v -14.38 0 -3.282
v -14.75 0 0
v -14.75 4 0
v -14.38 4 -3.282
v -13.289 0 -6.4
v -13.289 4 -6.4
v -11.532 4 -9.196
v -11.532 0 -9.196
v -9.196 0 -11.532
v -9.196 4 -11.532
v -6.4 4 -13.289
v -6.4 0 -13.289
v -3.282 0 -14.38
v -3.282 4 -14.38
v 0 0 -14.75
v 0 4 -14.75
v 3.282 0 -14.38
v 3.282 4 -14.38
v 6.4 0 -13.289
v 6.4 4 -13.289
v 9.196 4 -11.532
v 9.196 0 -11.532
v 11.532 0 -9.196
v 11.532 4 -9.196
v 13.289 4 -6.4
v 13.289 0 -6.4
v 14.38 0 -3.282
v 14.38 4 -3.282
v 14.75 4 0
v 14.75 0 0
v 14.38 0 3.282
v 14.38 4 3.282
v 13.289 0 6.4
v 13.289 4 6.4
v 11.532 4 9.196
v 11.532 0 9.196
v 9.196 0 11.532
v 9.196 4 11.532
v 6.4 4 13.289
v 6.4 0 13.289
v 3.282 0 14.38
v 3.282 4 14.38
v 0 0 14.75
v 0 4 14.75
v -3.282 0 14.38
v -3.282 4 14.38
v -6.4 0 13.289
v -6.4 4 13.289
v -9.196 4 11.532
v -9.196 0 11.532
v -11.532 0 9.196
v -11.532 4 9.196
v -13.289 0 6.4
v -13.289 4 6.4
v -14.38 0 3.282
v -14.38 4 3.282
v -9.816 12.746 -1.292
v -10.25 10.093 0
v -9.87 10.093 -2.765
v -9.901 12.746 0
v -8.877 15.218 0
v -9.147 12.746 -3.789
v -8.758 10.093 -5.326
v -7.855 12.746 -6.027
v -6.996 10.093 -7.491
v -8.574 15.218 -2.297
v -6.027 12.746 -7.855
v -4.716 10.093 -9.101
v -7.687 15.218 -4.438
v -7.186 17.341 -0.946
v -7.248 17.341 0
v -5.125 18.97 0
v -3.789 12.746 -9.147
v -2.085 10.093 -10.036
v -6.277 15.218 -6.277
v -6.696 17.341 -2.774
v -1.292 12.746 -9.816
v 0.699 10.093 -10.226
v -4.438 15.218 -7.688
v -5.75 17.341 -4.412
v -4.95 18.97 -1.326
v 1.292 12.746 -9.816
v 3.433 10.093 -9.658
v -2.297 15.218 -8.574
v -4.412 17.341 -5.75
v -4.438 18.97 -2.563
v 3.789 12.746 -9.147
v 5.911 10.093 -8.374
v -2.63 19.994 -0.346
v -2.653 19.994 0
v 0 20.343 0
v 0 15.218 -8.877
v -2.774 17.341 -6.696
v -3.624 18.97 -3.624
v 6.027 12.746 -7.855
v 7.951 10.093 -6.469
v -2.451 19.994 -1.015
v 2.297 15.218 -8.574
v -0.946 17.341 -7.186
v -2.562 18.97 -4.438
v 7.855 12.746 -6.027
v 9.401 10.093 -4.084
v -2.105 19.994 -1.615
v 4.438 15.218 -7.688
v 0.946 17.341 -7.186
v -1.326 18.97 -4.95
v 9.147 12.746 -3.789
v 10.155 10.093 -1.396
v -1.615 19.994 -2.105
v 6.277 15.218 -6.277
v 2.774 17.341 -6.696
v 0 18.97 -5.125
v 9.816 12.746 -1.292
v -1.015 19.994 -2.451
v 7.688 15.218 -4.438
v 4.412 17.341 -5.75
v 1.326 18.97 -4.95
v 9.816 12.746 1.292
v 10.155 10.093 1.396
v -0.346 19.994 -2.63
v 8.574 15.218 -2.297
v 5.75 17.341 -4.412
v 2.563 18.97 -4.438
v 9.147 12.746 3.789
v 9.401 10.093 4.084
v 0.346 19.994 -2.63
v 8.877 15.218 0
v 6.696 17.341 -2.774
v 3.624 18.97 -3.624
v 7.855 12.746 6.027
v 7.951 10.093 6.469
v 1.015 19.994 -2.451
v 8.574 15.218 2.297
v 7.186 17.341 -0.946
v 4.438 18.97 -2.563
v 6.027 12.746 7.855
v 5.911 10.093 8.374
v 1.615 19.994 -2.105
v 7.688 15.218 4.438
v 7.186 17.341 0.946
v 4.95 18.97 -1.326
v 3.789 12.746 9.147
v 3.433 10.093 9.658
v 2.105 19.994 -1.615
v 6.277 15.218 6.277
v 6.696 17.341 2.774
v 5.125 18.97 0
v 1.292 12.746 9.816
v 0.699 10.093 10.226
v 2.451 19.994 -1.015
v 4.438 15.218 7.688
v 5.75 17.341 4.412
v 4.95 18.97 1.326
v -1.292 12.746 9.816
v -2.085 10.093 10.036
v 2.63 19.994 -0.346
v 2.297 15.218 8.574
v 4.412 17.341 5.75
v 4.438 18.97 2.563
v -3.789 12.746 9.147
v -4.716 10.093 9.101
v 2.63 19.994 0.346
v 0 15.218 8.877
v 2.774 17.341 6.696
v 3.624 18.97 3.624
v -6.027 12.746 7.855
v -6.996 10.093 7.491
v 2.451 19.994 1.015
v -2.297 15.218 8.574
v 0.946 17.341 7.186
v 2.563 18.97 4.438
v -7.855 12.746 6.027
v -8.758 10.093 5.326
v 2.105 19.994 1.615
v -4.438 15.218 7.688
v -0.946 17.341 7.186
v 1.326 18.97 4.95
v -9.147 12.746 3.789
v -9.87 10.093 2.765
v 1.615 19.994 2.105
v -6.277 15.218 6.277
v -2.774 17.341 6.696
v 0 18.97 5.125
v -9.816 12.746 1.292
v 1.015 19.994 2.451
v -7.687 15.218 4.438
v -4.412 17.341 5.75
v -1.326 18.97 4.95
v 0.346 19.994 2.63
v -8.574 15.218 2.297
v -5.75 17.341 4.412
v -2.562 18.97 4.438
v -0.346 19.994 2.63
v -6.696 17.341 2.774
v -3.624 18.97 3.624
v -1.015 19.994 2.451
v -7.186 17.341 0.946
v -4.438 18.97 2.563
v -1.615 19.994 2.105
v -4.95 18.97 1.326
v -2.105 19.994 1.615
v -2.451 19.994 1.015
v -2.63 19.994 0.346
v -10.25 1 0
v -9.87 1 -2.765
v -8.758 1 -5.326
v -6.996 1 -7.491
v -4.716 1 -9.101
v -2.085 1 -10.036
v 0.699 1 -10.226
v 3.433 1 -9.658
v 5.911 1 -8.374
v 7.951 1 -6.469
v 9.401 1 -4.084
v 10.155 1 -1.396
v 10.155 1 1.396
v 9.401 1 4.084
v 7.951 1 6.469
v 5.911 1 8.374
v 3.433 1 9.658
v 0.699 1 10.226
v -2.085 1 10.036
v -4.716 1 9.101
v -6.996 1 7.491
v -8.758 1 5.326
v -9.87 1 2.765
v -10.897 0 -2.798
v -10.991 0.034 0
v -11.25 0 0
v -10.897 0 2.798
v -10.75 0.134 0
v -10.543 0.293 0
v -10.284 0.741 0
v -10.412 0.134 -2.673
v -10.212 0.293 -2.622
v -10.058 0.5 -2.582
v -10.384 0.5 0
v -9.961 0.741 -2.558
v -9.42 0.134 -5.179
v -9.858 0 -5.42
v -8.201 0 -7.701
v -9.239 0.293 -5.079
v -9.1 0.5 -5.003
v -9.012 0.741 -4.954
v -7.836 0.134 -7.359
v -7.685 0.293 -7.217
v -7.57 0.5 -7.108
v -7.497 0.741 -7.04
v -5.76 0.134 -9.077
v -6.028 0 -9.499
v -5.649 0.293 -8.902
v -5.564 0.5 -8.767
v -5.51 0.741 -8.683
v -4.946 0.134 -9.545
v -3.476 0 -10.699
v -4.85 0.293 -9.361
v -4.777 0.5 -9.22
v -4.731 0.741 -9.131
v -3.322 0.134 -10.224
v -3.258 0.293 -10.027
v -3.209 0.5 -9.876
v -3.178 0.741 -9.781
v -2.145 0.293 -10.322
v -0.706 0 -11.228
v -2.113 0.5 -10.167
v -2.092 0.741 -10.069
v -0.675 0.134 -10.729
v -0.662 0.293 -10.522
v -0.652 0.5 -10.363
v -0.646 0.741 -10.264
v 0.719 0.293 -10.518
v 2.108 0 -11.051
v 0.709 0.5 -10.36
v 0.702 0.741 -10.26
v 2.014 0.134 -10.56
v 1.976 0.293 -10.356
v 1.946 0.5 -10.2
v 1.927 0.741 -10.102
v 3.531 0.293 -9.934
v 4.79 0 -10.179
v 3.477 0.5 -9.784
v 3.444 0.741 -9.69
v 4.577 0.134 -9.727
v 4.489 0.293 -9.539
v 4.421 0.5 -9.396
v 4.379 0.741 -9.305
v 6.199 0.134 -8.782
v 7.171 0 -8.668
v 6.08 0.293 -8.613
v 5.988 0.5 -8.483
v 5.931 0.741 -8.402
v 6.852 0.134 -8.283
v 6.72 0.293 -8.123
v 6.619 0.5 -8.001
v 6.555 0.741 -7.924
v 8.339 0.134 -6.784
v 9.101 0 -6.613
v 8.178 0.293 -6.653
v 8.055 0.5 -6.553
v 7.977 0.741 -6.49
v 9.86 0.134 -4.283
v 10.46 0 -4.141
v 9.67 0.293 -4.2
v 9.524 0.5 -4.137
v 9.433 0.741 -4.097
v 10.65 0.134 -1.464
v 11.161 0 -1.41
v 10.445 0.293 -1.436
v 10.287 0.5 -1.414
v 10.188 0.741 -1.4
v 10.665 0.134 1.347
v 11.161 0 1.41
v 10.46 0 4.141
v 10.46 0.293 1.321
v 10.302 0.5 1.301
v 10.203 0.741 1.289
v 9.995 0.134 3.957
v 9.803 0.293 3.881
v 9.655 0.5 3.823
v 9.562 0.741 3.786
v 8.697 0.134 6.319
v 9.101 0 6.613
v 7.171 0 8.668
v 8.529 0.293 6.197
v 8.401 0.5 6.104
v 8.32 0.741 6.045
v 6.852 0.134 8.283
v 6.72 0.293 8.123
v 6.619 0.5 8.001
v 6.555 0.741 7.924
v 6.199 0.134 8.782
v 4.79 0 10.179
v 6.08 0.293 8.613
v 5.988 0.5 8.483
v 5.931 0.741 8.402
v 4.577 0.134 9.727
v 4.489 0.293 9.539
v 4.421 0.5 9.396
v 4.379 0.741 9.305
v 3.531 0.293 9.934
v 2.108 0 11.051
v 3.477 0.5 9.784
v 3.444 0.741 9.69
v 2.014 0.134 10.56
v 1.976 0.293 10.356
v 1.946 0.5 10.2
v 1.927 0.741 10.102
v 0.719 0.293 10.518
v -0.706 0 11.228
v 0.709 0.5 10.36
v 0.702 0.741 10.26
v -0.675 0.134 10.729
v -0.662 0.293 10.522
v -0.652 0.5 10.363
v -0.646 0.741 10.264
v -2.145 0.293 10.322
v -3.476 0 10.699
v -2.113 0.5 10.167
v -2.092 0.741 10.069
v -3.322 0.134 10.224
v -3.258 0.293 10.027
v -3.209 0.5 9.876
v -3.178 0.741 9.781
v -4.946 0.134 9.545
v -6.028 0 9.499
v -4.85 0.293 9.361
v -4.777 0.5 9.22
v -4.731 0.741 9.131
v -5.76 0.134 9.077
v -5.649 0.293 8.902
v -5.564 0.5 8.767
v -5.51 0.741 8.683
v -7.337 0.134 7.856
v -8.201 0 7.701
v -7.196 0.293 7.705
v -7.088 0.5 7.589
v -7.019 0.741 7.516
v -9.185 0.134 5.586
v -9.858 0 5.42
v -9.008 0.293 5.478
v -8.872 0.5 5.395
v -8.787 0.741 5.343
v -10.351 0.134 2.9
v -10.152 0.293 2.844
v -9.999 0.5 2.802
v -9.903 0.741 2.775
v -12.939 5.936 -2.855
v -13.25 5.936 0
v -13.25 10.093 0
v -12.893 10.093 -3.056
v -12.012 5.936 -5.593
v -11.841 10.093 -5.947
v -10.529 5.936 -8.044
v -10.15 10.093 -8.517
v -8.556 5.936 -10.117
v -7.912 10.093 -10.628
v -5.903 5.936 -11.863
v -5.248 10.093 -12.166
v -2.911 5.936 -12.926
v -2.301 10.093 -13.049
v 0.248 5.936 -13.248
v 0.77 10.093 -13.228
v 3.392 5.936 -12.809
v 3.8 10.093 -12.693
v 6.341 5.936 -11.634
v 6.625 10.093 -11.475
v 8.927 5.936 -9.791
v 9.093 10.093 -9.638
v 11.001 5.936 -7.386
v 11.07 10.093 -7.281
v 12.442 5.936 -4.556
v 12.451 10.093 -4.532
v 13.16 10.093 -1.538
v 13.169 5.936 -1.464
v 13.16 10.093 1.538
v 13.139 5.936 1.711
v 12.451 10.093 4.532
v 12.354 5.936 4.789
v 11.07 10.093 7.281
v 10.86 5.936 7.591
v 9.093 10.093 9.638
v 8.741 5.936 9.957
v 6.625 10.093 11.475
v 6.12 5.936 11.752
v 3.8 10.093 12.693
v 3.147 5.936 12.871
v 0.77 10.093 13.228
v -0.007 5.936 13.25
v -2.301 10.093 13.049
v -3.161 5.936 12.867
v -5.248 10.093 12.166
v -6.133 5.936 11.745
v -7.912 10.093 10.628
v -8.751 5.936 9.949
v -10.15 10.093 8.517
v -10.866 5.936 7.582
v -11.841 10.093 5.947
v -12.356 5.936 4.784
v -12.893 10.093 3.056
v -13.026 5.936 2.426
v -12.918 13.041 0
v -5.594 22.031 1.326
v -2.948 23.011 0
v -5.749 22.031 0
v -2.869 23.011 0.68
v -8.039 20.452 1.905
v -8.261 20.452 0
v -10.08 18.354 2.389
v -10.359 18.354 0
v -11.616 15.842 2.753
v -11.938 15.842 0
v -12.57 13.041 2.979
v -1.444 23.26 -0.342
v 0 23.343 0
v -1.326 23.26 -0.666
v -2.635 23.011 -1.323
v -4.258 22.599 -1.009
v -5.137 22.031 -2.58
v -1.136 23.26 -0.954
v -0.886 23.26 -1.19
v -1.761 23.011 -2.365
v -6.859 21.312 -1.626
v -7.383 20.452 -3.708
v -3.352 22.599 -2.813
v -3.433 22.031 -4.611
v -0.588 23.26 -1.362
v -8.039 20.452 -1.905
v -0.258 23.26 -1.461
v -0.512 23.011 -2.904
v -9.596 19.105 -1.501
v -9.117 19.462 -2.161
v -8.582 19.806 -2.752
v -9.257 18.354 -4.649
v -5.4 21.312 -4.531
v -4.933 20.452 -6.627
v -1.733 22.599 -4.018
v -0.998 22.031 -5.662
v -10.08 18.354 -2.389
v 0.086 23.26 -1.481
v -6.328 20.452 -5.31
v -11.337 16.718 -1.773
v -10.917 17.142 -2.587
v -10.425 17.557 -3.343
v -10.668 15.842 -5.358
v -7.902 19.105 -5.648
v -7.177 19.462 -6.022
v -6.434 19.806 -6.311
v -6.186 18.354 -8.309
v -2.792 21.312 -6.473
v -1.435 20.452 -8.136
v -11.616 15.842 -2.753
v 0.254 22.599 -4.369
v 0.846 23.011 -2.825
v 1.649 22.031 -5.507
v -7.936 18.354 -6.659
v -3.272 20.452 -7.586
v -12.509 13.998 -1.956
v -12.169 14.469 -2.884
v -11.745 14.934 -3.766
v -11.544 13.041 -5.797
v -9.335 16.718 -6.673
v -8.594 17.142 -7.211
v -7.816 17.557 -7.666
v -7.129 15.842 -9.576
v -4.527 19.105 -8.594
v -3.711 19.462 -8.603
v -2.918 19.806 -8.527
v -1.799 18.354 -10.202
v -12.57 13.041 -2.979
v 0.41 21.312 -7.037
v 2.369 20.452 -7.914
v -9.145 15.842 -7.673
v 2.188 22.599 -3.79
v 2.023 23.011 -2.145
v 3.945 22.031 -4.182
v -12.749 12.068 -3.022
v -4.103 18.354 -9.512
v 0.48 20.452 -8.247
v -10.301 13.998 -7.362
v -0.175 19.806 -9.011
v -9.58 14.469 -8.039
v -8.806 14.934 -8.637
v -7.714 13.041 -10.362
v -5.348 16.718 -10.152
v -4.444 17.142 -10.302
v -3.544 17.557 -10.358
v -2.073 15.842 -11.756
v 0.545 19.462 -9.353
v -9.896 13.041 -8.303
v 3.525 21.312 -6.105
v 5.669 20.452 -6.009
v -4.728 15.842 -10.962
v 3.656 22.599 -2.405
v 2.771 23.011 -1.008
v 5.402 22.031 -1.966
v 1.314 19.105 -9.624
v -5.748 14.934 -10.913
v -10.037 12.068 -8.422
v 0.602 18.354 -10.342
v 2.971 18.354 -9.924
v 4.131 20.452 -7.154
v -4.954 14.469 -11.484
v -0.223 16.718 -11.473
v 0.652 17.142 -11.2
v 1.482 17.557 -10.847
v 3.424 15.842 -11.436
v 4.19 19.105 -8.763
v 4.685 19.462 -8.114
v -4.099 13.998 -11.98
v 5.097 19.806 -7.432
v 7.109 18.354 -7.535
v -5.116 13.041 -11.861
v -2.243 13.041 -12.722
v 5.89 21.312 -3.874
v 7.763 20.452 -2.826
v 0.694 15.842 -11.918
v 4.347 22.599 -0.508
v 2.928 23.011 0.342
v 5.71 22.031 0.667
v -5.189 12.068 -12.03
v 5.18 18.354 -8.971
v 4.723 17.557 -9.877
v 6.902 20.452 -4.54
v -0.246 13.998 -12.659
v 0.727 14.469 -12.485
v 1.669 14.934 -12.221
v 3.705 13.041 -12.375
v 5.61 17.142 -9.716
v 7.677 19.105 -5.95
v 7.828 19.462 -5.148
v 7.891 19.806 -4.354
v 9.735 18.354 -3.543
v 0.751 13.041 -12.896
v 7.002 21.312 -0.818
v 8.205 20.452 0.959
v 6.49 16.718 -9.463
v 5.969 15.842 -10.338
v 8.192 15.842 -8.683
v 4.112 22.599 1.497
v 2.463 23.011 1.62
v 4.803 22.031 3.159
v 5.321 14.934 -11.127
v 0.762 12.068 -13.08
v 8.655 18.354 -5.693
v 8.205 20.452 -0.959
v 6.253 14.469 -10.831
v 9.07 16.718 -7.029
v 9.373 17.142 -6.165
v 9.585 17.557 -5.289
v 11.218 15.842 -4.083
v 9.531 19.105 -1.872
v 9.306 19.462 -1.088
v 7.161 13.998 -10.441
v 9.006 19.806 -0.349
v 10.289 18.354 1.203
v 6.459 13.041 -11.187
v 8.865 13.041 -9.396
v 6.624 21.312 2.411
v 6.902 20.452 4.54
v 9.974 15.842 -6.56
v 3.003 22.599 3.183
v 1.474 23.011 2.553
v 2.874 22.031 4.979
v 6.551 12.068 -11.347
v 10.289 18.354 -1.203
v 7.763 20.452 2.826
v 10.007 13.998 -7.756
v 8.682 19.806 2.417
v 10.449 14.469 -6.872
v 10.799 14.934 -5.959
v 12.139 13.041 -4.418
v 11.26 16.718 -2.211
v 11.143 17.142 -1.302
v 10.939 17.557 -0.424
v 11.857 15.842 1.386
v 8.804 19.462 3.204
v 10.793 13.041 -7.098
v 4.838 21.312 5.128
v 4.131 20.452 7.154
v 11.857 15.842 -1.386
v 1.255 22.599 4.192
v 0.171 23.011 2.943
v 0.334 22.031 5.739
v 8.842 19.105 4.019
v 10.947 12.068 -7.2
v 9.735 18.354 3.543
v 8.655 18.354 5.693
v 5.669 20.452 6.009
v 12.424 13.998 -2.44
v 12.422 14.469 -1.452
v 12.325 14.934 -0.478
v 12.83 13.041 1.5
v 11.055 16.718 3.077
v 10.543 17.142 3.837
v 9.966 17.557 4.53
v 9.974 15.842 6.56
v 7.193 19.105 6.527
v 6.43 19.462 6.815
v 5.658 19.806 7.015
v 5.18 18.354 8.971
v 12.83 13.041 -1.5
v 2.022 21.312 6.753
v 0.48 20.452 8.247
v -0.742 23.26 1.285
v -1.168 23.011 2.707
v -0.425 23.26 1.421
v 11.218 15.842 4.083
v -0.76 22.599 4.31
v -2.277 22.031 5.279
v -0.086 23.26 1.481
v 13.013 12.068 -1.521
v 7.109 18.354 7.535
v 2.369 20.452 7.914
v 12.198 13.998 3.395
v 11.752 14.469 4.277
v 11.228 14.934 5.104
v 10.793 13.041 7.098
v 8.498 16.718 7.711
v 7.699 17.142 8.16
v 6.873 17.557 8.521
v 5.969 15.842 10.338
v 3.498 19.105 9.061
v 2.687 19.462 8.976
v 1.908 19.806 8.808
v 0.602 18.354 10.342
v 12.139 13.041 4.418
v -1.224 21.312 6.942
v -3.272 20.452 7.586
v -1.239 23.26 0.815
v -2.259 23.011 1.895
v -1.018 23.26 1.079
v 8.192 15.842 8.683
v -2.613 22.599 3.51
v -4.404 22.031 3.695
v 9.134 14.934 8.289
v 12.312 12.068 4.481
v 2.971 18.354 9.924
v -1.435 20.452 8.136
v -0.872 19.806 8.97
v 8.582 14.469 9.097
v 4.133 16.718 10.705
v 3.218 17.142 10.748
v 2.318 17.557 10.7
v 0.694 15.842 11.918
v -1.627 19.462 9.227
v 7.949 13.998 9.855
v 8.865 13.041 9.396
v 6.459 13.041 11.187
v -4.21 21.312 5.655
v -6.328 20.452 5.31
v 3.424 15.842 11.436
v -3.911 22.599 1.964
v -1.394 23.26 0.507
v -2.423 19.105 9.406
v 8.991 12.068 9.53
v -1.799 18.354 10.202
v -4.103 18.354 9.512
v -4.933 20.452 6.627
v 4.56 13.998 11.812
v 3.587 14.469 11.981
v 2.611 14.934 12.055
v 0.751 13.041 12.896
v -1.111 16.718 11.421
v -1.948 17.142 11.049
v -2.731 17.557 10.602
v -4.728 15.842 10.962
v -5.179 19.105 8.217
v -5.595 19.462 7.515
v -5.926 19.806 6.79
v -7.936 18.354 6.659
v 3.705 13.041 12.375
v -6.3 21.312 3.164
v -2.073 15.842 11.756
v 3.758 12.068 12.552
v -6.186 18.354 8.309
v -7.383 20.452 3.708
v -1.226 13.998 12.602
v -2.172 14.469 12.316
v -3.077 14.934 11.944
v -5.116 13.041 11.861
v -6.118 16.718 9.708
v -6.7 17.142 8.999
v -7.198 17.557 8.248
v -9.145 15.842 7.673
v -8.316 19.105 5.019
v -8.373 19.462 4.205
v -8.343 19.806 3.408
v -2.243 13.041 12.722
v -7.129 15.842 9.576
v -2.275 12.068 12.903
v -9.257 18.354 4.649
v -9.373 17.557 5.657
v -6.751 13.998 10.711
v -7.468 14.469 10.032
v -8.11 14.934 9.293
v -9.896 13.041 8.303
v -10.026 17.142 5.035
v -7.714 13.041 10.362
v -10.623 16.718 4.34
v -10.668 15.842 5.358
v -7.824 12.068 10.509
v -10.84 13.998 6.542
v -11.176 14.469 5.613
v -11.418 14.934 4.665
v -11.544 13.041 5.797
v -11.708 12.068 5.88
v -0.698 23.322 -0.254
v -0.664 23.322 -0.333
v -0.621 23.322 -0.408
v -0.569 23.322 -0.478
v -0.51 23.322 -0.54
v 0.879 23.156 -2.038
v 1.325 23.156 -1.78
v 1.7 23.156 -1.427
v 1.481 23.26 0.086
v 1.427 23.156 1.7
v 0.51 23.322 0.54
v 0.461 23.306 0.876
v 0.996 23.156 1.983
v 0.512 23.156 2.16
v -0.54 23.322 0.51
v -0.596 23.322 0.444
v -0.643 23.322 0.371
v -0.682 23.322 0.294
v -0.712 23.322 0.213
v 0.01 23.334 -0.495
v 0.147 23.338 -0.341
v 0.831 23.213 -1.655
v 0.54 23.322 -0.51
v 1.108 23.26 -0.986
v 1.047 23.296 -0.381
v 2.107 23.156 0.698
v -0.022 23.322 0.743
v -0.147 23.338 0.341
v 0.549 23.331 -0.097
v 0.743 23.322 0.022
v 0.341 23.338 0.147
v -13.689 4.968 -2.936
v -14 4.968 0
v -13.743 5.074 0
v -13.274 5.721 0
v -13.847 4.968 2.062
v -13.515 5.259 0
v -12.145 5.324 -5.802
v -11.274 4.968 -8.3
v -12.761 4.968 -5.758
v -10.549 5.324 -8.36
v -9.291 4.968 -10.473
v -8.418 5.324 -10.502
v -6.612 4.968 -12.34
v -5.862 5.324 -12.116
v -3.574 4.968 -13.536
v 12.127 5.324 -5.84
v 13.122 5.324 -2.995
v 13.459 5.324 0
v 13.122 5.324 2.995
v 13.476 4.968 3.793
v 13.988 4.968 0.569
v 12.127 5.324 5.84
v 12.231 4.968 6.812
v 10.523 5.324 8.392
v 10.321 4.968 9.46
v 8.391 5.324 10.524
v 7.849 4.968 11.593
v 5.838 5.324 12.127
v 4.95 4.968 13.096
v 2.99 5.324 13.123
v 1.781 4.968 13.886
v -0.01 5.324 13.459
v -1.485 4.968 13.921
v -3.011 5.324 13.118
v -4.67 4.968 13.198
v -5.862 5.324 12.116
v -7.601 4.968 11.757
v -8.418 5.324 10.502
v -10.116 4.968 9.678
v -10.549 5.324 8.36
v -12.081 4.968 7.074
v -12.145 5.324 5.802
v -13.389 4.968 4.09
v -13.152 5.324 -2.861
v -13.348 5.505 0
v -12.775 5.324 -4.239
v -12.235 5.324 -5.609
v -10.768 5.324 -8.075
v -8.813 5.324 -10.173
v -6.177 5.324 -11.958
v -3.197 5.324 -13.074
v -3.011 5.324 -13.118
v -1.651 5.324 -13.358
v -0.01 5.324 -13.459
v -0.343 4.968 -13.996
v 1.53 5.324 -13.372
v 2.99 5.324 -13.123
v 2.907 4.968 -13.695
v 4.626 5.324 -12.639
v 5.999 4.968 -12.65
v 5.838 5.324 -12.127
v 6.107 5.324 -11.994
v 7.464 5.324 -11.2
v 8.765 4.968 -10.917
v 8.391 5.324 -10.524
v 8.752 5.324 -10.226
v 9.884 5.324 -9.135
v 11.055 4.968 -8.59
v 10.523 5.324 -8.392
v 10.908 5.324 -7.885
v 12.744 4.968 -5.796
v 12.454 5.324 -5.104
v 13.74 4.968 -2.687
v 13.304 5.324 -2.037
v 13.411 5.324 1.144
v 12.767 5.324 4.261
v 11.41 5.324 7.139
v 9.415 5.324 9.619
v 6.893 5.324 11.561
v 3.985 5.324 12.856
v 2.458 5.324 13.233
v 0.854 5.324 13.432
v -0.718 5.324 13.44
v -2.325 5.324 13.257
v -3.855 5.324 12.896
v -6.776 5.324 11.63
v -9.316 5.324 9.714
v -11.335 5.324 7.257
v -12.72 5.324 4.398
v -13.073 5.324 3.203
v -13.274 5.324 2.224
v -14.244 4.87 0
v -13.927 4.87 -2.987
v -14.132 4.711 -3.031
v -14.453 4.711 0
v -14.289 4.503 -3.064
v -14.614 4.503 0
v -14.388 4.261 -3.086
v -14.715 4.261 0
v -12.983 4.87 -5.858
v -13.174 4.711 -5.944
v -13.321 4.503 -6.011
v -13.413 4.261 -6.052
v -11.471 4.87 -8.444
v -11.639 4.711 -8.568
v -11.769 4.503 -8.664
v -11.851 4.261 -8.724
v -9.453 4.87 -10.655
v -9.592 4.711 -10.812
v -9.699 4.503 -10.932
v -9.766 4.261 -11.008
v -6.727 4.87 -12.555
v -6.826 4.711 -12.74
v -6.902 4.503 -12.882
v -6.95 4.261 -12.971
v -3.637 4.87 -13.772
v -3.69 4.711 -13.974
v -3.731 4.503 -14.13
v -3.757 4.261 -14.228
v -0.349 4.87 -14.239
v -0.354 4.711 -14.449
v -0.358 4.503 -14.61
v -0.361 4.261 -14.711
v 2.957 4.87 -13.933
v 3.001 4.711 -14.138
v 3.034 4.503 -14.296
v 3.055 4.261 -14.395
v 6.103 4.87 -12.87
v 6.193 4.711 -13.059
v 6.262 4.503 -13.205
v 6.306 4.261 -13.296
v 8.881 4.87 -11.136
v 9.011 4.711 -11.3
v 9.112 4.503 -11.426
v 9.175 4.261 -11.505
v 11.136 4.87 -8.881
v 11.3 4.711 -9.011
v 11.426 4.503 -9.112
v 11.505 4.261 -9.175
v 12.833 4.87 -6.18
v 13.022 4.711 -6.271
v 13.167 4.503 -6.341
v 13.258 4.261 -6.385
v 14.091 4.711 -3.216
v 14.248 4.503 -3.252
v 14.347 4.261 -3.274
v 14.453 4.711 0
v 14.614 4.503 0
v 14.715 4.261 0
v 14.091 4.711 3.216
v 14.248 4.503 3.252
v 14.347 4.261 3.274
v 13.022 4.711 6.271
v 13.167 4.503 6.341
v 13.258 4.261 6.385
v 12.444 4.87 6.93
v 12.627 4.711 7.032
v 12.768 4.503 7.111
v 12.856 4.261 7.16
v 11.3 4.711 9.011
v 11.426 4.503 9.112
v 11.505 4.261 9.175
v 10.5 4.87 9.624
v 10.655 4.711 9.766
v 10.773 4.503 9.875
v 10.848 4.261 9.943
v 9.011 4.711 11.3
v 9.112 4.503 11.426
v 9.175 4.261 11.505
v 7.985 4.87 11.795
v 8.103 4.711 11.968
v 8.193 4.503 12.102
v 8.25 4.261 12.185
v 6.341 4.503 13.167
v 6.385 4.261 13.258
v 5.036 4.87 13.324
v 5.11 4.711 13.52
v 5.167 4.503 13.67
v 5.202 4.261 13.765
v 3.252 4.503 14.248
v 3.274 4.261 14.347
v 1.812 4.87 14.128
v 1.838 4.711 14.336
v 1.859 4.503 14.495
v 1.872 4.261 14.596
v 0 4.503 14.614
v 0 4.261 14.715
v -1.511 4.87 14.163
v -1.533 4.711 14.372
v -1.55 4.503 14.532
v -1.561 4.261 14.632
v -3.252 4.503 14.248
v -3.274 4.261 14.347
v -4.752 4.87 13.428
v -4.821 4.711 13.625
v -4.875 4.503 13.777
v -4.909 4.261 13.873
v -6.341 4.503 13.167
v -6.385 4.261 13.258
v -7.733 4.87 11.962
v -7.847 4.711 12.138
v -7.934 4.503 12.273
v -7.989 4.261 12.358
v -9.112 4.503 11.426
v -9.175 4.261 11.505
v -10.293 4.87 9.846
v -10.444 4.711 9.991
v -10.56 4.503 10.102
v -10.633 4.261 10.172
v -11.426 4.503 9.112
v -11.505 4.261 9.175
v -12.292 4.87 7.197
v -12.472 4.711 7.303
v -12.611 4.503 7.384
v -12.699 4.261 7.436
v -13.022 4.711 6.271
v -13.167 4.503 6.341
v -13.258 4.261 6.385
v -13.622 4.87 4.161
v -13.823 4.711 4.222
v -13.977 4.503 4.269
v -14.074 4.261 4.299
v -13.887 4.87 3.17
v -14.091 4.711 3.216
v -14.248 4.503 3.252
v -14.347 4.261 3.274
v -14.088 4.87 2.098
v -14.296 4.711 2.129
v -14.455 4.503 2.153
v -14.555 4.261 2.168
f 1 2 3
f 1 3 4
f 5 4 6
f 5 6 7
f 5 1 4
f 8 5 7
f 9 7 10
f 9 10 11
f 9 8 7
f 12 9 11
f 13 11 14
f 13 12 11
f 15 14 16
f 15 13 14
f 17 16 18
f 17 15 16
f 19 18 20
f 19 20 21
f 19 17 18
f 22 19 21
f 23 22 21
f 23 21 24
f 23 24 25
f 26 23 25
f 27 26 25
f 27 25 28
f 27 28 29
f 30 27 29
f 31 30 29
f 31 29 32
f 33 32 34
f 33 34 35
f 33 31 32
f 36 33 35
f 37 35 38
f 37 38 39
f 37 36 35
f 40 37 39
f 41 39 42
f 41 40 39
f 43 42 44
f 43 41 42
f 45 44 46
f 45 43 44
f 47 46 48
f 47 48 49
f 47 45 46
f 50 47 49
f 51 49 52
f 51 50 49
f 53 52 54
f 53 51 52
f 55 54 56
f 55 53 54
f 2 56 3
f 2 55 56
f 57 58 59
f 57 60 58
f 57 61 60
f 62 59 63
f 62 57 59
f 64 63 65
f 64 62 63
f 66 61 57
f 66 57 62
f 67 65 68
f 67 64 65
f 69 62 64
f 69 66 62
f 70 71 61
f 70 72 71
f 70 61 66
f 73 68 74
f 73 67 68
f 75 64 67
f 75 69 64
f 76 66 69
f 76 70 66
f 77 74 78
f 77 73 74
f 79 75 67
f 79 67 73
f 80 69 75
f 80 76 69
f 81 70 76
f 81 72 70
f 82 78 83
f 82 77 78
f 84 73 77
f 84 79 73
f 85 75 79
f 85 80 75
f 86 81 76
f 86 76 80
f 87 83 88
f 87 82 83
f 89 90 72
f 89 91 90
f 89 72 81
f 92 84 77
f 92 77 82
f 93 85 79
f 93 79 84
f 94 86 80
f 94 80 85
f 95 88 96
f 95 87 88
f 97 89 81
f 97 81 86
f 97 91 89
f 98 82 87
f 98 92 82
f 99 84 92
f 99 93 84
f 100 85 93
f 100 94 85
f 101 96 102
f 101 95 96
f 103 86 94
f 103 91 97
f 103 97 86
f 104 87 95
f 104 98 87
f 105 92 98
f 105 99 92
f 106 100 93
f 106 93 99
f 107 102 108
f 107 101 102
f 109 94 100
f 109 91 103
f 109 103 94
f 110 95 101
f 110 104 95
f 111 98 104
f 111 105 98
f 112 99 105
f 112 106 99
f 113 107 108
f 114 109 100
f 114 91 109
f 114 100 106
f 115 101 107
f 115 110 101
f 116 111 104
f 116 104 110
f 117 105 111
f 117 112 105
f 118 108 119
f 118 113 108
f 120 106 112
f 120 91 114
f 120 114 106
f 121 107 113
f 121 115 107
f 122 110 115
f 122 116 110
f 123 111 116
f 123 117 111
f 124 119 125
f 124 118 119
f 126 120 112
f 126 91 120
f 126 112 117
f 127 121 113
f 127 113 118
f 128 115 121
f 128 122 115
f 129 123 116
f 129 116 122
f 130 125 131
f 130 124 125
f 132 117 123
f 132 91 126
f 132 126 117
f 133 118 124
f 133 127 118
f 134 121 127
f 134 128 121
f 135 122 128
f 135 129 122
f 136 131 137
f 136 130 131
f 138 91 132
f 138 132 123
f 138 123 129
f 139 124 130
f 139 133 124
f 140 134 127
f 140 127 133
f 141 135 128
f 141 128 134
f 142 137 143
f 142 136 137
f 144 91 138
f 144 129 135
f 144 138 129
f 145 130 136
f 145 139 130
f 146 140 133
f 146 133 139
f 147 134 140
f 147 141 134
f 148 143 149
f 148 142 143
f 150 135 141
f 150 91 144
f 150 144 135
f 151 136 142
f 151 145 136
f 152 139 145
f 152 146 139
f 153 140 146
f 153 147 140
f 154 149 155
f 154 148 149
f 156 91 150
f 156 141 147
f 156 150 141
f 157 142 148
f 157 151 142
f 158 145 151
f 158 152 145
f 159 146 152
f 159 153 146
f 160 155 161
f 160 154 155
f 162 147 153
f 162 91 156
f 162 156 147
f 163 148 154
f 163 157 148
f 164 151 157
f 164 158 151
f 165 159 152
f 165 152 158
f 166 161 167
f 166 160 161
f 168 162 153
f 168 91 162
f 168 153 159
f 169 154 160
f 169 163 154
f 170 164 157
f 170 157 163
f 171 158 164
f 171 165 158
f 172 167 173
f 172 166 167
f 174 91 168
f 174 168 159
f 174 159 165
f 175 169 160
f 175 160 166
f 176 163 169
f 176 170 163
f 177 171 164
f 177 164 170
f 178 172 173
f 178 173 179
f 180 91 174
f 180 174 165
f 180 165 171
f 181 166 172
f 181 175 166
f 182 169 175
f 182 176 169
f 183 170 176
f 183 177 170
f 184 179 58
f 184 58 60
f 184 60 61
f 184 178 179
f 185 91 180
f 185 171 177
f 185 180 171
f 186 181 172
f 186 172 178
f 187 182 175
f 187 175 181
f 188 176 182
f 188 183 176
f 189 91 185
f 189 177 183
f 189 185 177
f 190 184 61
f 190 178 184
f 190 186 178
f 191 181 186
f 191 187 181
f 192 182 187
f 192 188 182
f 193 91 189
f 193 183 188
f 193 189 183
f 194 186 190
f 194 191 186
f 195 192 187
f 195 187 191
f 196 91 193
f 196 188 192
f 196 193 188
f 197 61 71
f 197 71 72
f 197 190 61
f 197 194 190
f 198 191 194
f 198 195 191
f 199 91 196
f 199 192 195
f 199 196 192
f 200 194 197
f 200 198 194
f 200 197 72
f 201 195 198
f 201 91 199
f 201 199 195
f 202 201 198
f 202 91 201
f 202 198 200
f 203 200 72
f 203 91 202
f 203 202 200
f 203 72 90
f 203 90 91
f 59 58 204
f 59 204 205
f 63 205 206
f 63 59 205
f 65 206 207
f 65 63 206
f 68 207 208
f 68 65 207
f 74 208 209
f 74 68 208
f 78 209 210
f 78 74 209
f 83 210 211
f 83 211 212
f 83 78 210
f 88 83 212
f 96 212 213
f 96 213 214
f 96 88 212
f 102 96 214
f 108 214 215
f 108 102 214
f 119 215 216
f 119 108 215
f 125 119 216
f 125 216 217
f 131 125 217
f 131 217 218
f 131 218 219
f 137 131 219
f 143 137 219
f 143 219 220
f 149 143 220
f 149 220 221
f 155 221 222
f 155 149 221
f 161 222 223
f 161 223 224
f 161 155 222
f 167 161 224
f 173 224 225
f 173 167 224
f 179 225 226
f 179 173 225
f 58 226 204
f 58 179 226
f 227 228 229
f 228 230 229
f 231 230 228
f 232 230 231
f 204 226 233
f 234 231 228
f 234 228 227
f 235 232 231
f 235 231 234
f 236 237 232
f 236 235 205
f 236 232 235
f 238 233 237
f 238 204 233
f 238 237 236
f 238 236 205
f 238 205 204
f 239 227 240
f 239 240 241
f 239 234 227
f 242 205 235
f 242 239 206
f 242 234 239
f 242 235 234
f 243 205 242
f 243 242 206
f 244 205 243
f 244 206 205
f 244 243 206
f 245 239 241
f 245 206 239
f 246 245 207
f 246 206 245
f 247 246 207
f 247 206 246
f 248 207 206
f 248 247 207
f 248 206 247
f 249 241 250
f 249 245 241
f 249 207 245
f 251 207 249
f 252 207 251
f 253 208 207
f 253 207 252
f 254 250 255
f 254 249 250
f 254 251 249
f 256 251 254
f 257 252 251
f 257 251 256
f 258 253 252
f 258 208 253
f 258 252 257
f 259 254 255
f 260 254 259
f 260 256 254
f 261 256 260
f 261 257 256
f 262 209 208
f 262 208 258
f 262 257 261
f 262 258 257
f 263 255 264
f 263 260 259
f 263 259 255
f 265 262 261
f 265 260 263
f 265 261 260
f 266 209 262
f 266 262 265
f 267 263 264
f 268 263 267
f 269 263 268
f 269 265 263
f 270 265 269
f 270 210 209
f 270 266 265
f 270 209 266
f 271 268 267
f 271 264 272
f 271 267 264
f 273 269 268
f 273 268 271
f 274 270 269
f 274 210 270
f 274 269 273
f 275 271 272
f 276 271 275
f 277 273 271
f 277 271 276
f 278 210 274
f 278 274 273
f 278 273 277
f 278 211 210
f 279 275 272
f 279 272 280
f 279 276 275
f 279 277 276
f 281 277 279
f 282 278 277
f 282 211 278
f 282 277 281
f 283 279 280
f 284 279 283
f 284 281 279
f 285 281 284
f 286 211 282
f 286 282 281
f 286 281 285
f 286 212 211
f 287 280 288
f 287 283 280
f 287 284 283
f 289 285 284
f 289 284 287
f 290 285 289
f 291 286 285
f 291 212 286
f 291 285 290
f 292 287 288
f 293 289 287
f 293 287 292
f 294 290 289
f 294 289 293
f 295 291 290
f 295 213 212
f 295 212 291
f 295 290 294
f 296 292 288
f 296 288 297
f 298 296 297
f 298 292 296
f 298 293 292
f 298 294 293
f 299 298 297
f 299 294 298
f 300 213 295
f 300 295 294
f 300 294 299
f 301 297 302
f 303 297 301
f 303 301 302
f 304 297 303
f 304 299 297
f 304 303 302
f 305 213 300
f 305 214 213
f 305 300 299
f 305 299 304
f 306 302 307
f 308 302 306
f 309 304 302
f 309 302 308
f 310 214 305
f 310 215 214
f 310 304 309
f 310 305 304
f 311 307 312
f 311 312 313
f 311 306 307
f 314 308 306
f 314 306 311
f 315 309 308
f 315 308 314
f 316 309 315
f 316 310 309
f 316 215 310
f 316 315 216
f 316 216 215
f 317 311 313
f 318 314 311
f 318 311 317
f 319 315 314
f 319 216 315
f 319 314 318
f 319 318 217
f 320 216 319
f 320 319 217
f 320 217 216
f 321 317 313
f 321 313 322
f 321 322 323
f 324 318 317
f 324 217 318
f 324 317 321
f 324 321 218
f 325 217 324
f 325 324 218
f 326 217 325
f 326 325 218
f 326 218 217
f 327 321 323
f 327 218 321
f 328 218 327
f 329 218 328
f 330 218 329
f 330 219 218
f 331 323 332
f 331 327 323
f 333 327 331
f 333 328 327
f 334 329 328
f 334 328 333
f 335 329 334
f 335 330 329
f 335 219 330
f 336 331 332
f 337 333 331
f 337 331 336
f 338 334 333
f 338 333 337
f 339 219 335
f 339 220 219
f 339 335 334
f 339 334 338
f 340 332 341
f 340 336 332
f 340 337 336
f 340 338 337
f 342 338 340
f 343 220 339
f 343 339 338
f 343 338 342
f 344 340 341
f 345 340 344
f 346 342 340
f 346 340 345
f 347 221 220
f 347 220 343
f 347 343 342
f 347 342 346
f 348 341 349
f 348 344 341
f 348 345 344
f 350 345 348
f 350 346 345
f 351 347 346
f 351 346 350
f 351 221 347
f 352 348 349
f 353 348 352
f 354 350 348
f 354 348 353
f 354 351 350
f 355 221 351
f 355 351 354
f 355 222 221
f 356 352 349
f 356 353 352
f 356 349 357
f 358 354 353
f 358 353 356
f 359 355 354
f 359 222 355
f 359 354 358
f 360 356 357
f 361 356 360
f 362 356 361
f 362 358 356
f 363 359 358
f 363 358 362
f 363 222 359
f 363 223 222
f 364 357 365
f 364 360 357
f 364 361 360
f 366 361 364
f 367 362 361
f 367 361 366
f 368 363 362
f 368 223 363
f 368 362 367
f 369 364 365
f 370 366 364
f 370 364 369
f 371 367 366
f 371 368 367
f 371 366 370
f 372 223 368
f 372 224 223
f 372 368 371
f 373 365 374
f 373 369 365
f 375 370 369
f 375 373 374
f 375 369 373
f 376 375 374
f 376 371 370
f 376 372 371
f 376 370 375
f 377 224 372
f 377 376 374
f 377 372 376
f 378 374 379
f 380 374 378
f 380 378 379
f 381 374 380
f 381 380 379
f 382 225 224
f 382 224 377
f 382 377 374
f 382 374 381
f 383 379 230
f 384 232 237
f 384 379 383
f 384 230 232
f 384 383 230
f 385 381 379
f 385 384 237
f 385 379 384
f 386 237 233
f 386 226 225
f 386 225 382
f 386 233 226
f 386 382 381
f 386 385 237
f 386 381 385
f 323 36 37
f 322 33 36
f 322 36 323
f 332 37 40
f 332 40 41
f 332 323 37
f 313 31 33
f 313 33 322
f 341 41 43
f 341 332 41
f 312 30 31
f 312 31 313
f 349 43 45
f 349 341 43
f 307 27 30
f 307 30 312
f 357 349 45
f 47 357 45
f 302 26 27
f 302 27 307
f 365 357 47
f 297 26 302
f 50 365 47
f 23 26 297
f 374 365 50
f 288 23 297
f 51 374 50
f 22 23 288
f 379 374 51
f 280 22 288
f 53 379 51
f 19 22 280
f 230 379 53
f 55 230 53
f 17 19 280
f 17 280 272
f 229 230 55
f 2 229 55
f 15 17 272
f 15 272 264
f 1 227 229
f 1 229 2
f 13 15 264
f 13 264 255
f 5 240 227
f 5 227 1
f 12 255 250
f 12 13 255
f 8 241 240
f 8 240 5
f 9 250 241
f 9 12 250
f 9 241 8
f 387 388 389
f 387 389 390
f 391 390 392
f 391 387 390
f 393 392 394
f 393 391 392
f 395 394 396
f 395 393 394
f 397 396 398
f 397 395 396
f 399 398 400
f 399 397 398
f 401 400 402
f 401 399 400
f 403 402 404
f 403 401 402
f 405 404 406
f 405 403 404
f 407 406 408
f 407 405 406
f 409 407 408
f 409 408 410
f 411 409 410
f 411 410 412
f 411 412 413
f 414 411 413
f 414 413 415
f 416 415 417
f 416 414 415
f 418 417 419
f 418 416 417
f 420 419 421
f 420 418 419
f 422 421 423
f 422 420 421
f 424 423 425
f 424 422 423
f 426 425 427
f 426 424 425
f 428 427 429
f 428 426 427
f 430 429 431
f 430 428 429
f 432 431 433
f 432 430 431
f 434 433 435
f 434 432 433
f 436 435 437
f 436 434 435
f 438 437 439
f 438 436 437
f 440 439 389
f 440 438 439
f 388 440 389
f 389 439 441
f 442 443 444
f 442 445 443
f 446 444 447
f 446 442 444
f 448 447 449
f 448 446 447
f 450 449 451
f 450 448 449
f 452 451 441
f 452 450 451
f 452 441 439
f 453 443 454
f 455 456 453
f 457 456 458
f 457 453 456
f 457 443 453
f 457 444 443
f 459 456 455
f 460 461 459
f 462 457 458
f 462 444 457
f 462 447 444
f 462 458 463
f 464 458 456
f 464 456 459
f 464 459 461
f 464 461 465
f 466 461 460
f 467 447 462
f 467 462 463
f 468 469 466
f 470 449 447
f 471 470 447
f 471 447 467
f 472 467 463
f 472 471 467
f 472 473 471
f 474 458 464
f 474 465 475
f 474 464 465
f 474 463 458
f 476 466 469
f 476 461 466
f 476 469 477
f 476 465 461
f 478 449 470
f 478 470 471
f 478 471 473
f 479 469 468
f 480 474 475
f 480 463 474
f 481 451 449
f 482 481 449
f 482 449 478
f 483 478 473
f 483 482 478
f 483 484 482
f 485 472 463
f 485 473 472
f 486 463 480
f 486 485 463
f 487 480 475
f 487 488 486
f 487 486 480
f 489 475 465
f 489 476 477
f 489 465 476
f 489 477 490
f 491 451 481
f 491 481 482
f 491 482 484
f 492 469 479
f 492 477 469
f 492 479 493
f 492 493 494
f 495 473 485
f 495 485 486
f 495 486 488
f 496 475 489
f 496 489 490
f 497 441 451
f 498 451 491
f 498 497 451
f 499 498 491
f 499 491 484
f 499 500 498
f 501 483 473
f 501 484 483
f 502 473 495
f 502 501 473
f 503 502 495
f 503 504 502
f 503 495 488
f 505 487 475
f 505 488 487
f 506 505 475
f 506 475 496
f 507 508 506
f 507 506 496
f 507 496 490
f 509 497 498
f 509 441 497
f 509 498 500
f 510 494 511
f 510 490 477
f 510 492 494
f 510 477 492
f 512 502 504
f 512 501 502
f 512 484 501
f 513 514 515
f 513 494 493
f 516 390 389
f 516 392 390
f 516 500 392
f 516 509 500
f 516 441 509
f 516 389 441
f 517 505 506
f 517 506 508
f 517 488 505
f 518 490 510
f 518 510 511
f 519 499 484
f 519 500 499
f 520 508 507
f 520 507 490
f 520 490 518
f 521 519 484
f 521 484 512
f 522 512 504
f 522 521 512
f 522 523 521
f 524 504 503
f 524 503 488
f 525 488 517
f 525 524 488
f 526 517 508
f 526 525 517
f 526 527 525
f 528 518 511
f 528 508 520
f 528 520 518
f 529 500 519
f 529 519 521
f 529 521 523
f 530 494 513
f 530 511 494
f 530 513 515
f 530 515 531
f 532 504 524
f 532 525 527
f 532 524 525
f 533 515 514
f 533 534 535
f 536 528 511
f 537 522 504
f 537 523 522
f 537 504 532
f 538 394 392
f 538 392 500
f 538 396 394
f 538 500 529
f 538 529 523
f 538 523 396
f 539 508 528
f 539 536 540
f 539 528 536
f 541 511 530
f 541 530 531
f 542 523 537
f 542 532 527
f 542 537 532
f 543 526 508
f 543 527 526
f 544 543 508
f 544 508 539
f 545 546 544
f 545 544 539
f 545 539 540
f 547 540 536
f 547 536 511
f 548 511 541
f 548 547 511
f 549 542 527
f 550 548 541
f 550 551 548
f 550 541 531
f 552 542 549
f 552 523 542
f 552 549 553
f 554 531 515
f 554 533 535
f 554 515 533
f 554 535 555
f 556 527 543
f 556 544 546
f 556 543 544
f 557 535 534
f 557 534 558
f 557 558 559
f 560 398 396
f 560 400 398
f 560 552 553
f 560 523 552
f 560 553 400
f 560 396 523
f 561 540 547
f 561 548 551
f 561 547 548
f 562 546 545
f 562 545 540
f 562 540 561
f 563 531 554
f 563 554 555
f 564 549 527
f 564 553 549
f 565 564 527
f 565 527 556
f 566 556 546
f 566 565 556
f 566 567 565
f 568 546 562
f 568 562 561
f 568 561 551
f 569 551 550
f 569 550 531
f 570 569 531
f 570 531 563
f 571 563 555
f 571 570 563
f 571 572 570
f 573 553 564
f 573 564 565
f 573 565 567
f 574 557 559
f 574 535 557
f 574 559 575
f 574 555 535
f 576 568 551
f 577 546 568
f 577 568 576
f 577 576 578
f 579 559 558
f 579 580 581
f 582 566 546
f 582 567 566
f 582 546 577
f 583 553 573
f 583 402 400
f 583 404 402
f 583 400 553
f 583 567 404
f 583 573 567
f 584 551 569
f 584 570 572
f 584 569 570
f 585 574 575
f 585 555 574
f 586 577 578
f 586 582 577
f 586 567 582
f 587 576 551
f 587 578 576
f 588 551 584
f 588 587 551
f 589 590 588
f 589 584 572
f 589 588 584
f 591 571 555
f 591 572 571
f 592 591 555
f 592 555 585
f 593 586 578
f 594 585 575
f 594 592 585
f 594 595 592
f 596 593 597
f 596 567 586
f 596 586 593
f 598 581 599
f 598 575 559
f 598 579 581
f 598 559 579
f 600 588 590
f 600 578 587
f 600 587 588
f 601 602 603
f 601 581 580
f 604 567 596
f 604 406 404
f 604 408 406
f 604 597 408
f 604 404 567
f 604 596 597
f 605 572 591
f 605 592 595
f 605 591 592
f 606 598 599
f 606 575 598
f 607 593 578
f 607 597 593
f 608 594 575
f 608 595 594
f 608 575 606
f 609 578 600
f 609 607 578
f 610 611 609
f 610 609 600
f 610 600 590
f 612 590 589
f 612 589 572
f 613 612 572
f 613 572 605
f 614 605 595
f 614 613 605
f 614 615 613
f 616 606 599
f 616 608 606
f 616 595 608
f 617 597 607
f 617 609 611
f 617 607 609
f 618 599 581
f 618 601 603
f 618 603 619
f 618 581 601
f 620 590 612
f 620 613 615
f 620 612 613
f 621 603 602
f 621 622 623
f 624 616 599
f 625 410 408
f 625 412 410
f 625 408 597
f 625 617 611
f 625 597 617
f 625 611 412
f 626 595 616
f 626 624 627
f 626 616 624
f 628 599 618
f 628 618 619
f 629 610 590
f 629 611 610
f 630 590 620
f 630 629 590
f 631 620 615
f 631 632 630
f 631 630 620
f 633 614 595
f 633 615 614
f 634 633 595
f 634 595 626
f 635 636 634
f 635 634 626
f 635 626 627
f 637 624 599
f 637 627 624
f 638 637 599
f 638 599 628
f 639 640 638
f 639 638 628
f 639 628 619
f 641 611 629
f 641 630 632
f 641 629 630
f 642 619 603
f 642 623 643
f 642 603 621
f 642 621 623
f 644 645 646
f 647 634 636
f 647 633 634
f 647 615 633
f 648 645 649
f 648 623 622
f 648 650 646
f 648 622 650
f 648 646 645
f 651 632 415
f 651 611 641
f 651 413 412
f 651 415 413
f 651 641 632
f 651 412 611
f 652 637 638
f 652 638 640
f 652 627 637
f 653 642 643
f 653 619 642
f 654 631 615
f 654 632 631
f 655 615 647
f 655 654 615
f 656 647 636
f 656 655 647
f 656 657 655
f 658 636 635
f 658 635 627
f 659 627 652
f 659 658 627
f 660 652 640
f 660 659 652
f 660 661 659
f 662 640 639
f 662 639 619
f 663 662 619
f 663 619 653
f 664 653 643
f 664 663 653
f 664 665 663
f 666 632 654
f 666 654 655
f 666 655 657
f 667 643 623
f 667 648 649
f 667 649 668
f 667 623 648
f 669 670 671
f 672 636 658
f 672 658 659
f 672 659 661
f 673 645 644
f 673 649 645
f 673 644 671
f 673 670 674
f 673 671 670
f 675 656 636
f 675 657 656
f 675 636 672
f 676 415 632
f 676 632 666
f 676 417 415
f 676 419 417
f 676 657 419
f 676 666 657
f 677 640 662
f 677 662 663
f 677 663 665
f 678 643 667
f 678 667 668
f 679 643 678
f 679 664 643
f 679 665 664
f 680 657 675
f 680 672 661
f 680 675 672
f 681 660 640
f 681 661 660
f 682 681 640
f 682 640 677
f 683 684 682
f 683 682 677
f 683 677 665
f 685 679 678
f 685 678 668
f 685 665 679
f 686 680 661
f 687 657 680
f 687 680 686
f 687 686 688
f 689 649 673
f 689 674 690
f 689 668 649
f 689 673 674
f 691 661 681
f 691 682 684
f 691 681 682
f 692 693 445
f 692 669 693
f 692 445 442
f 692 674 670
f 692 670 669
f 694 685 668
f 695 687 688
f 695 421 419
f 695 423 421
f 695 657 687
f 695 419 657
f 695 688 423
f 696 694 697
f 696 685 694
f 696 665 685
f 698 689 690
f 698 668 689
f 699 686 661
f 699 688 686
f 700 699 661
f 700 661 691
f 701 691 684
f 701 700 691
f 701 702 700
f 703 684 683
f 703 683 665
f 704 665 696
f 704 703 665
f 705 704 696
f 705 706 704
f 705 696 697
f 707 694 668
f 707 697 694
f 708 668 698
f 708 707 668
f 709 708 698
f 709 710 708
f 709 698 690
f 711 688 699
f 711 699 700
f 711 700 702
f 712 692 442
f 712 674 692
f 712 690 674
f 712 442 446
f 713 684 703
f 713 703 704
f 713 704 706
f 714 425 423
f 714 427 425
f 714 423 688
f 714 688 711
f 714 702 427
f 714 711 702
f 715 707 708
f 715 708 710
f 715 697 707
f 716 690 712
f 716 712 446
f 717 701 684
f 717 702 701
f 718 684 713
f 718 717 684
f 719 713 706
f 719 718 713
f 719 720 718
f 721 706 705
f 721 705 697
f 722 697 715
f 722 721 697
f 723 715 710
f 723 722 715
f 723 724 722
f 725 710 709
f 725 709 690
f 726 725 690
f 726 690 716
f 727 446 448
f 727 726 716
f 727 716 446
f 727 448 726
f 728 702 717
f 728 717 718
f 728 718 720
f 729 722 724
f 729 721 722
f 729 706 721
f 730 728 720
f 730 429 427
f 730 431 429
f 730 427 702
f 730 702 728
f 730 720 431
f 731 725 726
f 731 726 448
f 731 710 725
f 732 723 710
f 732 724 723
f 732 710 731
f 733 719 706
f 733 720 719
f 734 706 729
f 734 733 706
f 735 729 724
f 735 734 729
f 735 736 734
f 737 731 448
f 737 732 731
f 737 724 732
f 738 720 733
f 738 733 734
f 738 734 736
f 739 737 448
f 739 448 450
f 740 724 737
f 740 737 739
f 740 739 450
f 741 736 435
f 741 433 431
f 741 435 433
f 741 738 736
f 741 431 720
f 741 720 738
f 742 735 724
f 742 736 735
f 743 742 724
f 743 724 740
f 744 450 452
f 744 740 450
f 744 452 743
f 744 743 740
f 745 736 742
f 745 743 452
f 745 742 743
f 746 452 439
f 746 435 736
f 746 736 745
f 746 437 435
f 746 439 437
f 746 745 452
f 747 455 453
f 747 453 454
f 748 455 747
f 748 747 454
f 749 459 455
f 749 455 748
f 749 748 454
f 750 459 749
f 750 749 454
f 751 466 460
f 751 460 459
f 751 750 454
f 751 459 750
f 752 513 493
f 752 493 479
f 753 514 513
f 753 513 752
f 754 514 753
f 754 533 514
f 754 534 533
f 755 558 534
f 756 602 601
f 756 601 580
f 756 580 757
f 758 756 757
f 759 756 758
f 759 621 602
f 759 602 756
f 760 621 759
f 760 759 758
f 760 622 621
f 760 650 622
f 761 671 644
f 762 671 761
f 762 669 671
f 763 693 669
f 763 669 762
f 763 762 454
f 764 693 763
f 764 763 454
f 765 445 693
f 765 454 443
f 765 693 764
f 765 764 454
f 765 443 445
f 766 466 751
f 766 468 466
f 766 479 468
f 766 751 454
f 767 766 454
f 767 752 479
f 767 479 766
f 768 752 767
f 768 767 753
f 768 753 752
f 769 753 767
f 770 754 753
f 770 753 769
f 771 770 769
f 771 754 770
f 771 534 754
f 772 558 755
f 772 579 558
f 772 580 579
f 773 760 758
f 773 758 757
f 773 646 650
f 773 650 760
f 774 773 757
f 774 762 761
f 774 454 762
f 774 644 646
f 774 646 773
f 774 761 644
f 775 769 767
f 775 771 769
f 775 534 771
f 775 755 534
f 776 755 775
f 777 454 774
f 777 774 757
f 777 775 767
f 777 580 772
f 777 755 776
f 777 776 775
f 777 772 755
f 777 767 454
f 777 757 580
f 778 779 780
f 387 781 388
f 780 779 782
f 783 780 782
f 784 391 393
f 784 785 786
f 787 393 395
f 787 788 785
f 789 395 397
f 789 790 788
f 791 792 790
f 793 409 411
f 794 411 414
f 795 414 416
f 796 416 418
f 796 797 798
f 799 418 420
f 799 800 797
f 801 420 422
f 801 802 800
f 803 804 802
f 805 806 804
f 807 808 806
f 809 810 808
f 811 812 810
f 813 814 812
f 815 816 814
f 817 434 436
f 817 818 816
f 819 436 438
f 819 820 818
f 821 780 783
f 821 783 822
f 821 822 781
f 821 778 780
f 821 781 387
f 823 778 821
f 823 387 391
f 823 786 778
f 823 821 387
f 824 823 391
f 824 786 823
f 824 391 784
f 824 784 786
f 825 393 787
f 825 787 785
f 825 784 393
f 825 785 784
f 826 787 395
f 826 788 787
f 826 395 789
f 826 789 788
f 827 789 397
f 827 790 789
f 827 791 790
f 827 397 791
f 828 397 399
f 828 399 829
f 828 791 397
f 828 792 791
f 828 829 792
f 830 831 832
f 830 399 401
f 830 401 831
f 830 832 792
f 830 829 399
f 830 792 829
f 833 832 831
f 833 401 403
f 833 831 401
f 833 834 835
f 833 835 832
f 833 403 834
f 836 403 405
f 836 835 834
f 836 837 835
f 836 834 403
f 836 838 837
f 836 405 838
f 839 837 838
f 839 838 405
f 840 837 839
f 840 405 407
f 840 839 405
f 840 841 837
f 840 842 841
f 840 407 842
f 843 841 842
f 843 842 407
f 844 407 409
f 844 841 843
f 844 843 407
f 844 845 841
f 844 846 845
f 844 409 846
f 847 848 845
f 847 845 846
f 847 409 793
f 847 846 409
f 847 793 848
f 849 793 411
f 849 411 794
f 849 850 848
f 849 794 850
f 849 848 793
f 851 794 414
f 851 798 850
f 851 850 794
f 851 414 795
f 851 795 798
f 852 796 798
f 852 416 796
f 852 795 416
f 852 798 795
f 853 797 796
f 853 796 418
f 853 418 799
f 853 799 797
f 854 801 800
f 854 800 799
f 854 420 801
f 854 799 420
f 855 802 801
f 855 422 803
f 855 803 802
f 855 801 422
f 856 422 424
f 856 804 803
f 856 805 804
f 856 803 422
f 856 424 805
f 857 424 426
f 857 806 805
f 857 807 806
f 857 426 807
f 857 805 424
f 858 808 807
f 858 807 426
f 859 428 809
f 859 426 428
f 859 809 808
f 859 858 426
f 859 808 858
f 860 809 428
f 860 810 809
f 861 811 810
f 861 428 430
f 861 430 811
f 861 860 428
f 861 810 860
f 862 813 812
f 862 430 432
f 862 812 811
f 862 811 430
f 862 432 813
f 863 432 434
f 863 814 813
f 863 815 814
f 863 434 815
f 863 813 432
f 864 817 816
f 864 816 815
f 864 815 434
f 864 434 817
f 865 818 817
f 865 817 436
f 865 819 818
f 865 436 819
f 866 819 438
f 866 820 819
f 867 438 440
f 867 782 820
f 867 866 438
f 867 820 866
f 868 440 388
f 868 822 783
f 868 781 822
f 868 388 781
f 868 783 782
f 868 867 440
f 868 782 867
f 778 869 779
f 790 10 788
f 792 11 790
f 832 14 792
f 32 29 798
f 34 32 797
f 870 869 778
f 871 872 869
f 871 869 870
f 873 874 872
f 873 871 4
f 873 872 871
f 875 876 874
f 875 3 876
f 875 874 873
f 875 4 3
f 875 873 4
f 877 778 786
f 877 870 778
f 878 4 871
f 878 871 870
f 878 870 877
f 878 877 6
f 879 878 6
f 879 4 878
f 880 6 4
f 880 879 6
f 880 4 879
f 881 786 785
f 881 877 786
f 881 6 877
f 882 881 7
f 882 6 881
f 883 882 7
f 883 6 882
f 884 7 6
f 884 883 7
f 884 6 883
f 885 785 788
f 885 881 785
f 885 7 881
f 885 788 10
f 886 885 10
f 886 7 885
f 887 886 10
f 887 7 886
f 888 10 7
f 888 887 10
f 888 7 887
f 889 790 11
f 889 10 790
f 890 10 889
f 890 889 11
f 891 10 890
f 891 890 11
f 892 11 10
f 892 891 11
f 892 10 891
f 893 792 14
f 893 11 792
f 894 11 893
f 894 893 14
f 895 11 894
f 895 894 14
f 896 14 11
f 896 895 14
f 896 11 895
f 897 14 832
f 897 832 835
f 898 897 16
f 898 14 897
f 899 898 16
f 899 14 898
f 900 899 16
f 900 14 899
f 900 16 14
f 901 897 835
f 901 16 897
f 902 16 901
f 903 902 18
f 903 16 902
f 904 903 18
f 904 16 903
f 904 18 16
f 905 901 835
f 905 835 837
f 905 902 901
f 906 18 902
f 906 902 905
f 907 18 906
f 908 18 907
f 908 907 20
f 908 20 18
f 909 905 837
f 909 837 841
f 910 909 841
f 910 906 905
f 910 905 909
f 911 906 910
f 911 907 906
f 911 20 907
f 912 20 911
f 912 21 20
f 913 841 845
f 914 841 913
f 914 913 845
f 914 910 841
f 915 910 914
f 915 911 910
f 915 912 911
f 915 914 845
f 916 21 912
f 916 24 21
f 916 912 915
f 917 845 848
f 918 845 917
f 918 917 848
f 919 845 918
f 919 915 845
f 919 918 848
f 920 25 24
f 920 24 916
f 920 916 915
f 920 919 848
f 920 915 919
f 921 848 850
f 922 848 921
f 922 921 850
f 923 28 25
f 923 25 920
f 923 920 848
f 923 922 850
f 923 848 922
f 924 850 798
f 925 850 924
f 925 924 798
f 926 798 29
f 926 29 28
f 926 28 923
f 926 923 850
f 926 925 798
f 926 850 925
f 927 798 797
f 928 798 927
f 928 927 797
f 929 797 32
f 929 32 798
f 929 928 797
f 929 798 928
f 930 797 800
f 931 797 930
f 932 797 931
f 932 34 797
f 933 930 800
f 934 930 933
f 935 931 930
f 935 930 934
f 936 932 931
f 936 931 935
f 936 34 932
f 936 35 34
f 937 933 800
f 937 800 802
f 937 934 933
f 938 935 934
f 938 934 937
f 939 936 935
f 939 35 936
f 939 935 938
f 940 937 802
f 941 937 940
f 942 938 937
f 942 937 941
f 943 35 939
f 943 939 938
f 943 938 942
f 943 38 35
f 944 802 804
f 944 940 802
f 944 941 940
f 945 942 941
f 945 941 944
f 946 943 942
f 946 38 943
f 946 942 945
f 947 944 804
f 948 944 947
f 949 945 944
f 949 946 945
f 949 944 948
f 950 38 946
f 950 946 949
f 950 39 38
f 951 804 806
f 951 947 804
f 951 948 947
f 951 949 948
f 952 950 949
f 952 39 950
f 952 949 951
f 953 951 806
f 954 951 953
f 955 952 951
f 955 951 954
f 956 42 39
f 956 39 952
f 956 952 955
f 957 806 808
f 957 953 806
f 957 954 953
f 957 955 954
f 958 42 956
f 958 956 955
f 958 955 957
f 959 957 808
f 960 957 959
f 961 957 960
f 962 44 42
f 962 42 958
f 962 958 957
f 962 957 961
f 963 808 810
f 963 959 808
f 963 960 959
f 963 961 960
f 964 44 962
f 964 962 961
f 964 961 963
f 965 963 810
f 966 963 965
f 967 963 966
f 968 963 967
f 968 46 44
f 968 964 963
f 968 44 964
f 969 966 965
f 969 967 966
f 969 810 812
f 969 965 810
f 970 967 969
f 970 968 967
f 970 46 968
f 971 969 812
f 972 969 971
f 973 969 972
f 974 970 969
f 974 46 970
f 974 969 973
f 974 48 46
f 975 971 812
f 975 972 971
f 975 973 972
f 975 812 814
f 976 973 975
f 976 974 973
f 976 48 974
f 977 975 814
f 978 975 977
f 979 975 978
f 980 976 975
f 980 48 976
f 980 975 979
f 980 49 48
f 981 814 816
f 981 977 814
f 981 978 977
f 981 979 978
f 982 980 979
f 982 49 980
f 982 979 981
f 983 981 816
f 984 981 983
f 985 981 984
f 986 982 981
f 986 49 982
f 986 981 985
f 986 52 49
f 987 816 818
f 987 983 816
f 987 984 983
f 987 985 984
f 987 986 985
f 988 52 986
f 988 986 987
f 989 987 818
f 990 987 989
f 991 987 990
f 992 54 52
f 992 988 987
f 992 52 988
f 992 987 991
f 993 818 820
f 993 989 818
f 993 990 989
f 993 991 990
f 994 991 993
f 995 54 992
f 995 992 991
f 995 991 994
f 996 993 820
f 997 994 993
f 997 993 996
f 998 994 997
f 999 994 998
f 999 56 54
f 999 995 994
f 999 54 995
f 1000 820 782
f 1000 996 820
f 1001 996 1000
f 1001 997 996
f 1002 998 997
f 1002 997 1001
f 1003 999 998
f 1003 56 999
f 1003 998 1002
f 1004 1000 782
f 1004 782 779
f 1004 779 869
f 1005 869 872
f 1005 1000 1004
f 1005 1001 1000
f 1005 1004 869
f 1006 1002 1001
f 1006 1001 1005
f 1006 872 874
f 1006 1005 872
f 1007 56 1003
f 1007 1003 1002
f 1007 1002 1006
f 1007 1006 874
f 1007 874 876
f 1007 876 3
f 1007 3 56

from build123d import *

# Parameters (mm, degrees)
F2_R = 1
F3_R = 1
F4_R = 1


with BuildPart() as f1:
    # F0 (on Top) → F1 (revolve)
    with BuildSketch(Plane.XY):
        with BuildLine():
            ThreePointArc((-10.25, 10.092882), (-7.247845, 17.340726), (0, 20.342882))
            Line((0, 20.342882), (0, 23.342882))
            ThreePointArc((0, 23.342882), (-9.369165, 19.462047), (-13.25, 10.092882))
            Line((-13.25, 10.092882), (-13.25, 5))
            Line((-13.25, 5), (-14.75, 5))
            Line((-14.75, 5), (-14.75, 0))
            Line((-14.75, 0), (-13.25, 0))
            Line((-13.25, 0), (-10.25, 0))
            Line((-10.25, 0), (-10.25, 10.092882))
        make_face()
    revolve(axis=Axis((0, 12.932193, 0), (0, -1, 0)))

    # F2
    f2_edges = [f1.edges().sort_by_distance(p)[0] for p in [
        (14.75, 5, 0),
    ]]
    fillet(f2_edges, radius=F2_R)

    # F3
    f3_edges = [f1.edges().sort_by_distance(p)[0] for p in [
        (10.25, 0, 0),
    ]]
    fillet(f3_edges, radius=F3_R)

    # F4
    f4_edges = [f1.edges().sort_by_distance(p)[0] for p in [
        (13.25, 5, 0),
    ]]
    fillet(f4_edges, radius=F4_R)


solid = f1.part
